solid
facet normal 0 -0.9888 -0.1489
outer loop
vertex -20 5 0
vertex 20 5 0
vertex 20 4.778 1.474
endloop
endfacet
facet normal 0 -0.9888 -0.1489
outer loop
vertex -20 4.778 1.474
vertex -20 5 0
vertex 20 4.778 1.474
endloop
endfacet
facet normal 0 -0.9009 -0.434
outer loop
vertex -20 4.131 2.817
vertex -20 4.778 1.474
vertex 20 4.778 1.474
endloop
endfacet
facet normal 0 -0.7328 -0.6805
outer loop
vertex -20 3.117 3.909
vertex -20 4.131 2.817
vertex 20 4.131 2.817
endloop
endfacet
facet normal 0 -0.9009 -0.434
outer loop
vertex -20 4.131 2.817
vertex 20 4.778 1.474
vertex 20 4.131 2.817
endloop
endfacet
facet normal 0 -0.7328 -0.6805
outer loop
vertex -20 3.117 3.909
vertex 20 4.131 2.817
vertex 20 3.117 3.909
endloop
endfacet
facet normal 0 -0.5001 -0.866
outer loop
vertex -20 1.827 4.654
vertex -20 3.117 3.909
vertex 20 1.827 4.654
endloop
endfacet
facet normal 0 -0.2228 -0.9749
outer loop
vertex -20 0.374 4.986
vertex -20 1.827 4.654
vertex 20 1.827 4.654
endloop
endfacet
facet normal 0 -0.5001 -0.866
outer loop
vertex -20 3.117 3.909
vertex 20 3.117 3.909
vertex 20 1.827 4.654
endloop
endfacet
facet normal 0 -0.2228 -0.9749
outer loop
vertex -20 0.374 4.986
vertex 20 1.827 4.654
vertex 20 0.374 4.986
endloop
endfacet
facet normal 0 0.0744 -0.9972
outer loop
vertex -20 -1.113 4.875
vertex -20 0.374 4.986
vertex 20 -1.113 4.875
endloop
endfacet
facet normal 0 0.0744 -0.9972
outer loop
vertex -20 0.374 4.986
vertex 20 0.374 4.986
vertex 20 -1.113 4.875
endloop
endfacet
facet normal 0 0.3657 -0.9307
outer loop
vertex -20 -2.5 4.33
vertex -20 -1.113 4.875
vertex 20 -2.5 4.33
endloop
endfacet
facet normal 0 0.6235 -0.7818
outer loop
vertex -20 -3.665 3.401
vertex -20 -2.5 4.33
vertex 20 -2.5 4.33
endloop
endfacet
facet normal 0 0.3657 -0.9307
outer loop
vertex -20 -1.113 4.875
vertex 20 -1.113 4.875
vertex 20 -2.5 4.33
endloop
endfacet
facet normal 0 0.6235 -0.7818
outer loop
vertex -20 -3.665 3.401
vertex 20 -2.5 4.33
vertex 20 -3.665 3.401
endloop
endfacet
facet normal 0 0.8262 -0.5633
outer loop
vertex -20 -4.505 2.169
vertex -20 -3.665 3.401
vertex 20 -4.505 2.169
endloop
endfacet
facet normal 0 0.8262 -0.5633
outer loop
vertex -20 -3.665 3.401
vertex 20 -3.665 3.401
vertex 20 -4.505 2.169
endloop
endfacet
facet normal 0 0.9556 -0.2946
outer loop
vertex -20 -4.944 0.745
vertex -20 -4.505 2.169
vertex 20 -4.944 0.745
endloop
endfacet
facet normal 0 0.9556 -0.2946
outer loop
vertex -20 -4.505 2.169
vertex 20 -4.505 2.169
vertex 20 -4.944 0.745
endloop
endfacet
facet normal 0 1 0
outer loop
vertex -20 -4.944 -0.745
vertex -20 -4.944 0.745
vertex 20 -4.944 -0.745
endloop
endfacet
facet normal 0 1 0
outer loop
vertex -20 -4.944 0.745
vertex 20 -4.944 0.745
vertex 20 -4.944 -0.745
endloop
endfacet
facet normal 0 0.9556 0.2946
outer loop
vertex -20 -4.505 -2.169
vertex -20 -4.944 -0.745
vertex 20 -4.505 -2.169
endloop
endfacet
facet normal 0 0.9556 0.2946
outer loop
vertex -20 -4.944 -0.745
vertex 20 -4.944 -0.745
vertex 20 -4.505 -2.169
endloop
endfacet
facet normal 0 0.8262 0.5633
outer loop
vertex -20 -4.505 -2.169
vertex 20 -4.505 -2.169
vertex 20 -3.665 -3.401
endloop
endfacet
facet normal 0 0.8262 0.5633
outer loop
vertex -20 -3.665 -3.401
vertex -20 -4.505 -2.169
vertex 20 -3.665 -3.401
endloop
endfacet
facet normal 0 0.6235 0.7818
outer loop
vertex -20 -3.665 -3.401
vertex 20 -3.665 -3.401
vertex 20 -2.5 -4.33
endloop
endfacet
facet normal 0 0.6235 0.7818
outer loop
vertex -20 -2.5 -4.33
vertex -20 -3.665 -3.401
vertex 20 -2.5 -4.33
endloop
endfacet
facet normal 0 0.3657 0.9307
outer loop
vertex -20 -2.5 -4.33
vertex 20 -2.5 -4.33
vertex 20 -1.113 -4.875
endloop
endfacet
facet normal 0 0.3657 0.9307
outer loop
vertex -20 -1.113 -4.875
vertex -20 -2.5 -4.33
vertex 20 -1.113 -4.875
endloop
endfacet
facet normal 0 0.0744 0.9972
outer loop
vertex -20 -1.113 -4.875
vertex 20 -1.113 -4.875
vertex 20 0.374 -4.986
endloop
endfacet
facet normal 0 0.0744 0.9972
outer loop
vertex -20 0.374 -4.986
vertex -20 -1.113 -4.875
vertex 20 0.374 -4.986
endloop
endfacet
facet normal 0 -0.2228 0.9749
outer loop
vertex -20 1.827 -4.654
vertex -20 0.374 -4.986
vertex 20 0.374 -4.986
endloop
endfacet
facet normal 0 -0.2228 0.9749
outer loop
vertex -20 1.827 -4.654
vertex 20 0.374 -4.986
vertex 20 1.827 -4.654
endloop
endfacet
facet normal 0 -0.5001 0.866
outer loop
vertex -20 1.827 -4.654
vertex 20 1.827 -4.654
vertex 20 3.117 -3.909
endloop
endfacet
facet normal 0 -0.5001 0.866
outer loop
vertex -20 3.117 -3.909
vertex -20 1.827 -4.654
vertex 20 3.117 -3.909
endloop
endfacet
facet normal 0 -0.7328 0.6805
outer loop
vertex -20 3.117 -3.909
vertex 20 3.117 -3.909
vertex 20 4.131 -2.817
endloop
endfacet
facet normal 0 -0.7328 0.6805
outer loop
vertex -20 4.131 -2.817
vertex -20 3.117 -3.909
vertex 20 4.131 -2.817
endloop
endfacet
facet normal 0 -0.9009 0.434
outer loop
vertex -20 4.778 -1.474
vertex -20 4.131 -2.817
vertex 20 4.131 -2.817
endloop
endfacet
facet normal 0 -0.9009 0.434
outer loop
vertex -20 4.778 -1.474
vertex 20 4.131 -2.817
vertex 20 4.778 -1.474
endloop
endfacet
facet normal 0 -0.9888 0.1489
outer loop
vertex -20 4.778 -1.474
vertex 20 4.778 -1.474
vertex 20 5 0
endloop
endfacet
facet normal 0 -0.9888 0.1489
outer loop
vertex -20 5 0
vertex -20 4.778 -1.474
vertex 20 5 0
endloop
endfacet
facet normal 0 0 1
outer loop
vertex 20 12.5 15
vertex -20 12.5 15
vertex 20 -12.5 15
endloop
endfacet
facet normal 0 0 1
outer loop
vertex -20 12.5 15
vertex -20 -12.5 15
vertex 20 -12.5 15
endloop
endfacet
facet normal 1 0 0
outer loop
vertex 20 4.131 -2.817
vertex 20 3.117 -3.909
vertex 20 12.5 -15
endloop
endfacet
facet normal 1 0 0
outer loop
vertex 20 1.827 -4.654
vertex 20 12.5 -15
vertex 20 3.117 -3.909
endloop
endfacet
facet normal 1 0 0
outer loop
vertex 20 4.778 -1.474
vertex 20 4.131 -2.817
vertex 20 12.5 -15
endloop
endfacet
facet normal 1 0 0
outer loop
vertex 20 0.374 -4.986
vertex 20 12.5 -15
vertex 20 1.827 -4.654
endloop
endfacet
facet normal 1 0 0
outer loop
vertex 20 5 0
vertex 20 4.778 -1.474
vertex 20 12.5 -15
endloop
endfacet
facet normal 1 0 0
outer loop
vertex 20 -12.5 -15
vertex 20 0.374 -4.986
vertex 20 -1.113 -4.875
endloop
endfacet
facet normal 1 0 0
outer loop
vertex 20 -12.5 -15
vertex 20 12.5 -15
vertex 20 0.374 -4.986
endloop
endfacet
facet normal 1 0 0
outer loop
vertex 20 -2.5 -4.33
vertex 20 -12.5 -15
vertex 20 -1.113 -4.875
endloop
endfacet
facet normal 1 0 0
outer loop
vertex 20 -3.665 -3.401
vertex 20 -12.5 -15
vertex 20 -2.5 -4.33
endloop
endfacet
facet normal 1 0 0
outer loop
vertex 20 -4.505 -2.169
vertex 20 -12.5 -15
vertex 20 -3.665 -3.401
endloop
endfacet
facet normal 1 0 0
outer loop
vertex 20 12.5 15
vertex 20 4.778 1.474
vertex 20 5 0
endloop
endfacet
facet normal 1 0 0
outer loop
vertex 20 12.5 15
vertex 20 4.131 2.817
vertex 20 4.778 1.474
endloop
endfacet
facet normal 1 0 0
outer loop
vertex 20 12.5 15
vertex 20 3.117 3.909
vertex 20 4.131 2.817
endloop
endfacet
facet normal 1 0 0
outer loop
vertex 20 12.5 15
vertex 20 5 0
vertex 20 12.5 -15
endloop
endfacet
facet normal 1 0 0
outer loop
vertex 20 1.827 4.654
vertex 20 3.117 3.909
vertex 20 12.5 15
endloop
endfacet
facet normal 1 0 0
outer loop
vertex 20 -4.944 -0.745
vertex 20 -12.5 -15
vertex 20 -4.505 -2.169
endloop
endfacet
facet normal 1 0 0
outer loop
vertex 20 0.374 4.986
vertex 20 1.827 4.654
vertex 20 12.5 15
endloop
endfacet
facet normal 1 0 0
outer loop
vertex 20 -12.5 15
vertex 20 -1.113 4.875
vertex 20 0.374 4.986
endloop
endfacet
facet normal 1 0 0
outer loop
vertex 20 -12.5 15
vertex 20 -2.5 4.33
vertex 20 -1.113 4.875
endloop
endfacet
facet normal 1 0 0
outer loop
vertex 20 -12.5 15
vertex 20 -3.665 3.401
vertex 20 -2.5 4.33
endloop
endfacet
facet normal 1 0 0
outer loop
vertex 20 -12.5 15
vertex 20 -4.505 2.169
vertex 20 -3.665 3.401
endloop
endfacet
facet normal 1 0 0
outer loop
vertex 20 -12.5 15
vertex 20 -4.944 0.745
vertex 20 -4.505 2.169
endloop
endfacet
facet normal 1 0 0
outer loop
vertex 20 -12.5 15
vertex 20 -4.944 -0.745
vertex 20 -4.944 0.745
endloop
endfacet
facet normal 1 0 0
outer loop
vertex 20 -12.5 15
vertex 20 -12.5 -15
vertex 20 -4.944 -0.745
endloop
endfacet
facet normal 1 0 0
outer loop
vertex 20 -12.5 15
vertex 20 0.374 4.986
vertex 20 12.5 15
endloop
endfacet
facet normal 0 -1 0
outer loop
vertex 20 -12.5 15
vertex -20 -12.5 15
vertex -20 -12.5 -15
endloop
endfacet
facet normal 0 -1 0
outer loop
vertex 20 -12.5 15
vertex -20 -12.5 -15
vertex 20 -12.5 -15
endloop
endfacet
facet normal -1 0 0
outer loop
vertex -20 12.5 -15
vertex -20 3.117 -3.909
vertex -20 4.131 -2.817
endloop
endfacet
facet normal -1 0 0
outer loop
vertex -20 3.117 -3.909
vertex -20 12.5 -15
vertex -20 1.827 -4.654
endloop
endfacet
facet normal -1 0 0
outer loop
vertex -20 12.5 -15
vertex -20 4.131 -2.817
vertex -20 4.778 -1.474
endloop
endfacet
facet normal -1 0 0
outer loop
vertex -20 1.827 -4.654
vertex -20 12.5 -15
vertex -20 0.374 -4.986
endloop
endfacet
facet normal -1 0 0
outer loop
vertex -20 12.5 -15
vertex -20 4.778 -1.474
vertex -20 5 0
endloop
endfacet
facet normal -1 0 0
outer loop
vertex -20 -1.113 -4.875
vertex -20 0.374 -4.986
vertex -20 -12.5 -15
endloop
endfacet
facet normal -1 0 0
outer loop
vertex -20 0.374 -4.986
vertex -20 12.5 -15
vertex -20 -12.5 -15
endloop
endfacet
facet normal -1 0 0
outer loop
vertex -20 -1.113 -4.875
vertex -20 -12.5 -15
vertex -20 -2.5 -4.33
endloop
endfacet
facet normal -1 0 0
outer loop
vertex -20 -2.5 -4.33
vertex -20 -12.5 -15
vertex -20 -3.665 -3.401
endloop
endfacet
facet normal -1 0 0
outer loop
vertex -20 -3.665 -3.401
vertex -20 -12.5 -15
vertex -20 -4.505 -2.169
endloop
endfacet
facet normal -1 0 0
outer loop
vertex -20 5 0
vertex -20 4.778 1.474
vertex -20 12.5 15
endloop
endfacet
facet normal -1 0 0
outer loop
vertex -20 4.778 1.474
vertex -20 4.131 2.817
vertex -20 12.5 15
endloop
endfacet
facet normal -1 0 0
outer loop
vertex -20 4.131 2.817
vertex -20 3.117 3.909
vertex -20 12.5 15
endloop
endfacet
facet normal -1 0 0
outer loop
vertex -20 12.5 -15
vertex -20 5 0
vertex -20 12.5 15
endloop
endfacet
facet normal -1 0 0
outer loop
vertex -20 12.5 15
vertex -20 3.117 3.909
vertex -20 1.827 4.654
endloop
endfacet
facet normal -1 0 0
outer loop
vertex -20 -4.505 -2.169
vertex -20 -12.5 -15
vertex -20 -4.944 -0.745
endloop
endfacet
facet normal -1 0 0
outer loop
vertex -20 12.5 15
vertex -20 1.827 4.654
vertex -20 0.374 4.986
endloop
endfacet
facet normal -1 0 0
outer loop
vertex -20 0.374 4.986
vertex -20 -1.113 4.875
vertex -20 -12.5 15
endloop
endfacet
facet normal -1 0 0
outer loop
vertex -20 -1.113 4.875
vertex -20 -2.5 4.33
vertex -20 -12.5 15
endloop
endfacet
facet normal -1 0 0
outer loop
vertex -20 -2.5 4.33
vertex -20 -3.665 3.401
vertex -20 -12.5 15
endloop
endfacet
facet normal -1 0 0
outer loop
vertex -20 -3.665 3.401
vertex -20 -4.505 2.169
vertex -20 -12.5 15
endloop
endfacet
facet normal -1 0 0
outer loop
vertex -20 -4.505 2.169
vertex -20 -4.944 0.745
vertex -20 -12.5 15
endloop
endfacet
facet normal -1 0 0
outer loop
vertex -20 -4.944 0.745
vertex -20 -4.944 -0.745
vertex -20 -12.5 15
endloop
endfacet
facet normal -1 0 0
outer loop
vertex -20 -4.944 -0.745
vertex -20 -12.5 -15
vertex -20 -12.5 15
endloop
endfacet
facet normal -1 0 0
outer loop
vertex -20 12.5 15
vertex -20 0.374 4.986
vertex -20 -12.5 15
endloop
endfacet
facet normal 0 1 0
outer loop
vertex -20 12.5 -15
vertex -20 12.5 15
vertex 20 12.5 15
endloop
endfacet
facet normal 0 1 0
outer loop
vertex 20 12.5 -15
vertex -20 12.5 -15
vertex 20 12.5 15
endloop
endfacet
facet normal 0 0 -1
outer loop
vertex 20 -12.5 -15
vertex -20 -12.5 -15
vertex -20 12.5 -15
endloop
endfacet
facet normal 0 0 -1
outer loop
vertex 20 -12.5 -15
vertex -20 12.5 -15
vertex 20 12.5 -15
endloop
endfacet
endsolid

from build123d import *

# Parameters (mm, degrees)
F0_W     = 40
F0_H     = 30
F1_DEPTH = 12.5
F2_R     = 5
F3_DEPTH = 58


with BuildPart() as f1:
    # F0 (on Front) → F1 (new body, symmetric)
    with BuildSketch(Plane.XZ):
        Rectangle(F0_W, F0_H)
    extrude(amount=F1_DEPTH, both=True)

    # F2 (on face) → F3 (cut)
    with BuildSketch(Plane.YZ.offset(20)):
        Circle(F2_R)
    extrude(amount=-F3_DEPTH, mode=Mode.SUBTRACT)


solid = f1.part
